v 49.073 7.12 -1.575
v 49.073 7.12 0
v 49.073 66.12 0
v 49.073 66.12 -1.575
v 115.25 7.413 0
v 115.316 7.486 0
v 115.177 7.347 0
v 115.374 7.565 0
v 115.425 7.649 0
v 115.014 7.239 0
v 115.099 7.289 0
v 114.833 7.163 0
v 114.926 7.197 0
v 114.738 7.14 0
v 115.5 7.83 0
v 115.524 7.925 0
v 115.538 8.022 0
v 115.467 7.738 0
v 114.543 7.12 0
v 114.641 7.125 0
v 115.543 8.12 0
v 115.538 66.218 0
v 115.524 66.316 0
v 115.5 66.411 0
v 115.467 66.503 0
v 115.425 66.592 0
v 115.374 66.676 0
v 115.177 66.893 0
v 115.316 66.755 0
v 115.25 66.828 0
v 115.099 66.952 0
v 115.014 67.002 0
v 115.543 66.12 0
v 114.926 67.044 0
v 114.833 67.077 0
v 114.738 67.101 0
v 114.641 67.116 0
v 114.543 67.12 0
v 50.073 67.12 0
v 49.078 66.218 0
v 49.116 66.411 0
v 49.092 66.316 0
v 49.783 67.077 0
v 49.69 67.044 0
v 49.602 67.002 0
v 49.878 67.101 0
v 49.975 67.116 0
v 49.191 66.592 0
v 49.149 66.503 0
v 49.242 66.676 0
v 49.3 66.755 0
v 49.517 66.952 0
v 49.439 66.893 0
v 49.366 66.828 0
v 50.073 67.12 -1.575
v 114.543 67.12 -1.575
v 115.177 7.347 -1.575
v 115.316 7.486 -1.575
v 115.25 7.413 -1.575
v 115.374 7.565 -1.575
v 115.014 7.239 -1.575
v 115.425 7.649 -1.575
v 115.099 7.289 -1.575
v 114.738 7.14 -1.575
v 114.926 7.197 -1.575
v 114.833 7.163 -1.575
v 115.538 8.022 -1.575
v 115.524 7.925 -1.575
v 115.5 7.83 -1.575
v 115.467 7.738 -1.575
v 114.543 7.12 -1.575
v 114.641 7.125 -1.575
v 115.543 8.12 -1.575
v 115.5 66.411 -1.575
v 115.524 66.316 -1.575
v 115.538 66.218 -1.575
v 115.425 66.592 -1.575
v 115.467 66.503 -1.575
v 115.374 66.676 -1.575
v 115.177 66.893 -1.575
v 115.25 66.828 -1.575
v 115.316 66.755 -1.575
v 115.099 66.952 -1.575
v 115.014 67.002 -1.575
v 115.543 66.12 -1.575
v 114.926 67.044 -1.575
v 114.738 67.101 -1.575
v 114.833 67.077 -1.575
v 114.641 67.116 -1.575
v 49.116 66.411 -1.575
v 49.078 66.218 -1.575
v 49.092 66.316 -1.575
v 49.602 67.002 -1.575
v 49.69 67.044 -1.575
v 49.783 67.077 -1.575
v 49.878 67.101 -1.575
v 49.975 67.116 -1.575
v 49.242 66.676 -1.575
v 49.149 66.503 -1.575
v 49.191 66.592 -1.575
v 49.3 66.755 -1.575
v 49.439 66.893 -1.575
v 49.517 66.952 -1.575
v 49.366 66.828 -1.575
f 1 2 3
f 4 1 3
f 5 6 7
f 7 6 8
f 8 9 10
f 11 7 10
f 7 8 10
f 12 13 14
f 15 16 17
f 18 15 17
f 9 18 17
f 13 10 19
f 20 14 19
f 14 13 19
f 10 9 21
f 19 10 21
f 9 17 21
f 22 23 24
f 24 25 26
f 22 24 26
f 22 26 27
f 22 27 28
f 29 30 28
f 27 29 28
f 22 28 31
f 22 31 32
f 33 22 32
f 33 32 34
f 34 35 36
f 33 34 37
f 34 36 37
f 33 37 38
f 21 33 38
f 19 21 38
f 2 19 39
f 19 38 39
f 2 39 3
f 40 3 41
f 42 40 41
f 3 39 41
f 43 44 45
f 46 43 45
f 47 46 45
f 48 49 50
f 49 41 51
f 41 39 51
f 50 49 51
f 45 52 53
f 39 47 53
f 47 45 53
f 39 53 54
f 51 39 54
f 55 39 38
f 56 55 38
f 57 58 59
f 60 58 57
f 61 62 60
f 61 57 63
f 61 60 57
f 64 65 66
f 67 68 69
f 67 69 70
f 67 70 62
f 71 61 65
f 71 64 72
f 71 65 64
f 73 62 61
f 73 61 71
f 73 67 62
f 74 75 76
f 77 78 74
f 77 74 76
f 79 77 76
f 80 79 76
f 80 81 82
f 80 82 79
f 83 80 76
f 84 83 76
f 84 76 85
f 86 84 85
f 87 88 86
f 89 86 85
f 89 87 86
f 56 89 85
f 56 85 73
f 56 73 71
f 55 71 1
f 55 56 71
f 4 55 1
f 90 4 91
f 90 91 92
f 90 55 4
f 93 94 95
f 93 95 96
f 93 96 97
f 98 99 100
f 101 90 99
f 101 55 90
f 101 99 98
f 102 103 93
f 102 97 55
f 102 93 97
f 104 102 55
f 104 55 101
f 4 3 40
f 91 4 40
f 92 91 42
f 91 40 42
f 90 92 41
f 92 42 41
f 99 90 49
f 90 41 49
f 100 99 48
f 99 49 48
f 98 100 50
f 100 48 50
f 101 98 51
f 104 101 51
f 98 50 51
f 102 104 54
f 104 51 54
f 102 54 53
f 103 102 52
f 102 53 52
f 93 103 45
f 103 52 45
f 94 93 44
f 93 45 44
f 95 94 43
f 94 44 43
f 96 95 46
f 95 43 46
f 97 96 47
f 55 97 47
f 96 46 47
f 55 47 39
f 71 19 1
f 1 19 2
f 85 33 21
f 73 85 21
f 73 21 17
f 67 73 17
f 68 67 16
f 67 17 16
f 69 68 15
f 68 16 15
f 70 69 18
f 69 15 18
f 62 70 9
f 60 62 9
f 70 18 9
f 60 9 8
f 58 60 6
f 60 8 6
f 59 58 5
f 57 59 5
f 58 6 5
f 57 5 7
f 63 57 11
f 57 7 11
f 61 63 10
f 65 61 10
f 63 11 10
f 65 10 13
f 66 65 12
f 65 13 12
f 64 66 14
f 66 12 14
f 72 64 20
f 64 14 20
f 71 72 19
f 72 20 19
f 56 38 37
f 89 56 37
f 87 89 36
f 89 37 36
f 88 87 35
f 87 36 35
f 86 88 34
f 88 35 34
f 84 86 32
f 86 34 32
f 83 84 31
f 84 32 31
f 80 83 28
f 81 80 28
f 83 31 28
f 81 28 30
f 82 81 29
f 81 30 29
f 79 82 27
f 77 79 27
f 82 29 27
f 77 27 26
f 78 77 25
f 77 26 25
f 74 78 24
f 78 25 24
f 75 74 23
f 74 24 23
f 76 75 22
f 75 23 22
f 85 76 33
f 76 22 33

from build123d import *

# Parameters (mm, degrees)
BOSS_EXTRUDE1_DEPTH = 1.5748


with BuildPart() as part:
    # BPR2 PCB Outline → Boss-Extrude1 (new body)
    with BuildSketch(Plane.XY):
        with BuildLine():
            Line((114.542984325, 7.120432961), (102.642984325, 7.120432961))
            Line((102.642984325, 7.120432961), (82.642984325, 7.120432961))
            Line((82.642984325, 7.120432961), (49.072984325, 7.120432961))
            Line((49.072984325, 7.120432961), (49.072984325, 66.120432961))
            ThreePointArc((49.072984325, 66.120432961), (49.365877543, 66.827539743), (50.072984325, 67.120432961))
            Line((50.072984325, 67.120432961), (114.542984325, 67.120432961))
            ThreePointArc((114.542984325, 67.120432961), (115.250091106, 66.827539743), (115.542984325, 66.120432961))
            Line((115.542984325, 66.120432961), (115.542984325, 8.120432961))
            ThreePointArc((115.542984325, 8.120432961), (115.250091106, 7.41332618), (114.542984325, 7.120432961))
        make_face()
    extrude(amount=-BOSS_EXTRUDE1_DEPTH)


solid = part.part
